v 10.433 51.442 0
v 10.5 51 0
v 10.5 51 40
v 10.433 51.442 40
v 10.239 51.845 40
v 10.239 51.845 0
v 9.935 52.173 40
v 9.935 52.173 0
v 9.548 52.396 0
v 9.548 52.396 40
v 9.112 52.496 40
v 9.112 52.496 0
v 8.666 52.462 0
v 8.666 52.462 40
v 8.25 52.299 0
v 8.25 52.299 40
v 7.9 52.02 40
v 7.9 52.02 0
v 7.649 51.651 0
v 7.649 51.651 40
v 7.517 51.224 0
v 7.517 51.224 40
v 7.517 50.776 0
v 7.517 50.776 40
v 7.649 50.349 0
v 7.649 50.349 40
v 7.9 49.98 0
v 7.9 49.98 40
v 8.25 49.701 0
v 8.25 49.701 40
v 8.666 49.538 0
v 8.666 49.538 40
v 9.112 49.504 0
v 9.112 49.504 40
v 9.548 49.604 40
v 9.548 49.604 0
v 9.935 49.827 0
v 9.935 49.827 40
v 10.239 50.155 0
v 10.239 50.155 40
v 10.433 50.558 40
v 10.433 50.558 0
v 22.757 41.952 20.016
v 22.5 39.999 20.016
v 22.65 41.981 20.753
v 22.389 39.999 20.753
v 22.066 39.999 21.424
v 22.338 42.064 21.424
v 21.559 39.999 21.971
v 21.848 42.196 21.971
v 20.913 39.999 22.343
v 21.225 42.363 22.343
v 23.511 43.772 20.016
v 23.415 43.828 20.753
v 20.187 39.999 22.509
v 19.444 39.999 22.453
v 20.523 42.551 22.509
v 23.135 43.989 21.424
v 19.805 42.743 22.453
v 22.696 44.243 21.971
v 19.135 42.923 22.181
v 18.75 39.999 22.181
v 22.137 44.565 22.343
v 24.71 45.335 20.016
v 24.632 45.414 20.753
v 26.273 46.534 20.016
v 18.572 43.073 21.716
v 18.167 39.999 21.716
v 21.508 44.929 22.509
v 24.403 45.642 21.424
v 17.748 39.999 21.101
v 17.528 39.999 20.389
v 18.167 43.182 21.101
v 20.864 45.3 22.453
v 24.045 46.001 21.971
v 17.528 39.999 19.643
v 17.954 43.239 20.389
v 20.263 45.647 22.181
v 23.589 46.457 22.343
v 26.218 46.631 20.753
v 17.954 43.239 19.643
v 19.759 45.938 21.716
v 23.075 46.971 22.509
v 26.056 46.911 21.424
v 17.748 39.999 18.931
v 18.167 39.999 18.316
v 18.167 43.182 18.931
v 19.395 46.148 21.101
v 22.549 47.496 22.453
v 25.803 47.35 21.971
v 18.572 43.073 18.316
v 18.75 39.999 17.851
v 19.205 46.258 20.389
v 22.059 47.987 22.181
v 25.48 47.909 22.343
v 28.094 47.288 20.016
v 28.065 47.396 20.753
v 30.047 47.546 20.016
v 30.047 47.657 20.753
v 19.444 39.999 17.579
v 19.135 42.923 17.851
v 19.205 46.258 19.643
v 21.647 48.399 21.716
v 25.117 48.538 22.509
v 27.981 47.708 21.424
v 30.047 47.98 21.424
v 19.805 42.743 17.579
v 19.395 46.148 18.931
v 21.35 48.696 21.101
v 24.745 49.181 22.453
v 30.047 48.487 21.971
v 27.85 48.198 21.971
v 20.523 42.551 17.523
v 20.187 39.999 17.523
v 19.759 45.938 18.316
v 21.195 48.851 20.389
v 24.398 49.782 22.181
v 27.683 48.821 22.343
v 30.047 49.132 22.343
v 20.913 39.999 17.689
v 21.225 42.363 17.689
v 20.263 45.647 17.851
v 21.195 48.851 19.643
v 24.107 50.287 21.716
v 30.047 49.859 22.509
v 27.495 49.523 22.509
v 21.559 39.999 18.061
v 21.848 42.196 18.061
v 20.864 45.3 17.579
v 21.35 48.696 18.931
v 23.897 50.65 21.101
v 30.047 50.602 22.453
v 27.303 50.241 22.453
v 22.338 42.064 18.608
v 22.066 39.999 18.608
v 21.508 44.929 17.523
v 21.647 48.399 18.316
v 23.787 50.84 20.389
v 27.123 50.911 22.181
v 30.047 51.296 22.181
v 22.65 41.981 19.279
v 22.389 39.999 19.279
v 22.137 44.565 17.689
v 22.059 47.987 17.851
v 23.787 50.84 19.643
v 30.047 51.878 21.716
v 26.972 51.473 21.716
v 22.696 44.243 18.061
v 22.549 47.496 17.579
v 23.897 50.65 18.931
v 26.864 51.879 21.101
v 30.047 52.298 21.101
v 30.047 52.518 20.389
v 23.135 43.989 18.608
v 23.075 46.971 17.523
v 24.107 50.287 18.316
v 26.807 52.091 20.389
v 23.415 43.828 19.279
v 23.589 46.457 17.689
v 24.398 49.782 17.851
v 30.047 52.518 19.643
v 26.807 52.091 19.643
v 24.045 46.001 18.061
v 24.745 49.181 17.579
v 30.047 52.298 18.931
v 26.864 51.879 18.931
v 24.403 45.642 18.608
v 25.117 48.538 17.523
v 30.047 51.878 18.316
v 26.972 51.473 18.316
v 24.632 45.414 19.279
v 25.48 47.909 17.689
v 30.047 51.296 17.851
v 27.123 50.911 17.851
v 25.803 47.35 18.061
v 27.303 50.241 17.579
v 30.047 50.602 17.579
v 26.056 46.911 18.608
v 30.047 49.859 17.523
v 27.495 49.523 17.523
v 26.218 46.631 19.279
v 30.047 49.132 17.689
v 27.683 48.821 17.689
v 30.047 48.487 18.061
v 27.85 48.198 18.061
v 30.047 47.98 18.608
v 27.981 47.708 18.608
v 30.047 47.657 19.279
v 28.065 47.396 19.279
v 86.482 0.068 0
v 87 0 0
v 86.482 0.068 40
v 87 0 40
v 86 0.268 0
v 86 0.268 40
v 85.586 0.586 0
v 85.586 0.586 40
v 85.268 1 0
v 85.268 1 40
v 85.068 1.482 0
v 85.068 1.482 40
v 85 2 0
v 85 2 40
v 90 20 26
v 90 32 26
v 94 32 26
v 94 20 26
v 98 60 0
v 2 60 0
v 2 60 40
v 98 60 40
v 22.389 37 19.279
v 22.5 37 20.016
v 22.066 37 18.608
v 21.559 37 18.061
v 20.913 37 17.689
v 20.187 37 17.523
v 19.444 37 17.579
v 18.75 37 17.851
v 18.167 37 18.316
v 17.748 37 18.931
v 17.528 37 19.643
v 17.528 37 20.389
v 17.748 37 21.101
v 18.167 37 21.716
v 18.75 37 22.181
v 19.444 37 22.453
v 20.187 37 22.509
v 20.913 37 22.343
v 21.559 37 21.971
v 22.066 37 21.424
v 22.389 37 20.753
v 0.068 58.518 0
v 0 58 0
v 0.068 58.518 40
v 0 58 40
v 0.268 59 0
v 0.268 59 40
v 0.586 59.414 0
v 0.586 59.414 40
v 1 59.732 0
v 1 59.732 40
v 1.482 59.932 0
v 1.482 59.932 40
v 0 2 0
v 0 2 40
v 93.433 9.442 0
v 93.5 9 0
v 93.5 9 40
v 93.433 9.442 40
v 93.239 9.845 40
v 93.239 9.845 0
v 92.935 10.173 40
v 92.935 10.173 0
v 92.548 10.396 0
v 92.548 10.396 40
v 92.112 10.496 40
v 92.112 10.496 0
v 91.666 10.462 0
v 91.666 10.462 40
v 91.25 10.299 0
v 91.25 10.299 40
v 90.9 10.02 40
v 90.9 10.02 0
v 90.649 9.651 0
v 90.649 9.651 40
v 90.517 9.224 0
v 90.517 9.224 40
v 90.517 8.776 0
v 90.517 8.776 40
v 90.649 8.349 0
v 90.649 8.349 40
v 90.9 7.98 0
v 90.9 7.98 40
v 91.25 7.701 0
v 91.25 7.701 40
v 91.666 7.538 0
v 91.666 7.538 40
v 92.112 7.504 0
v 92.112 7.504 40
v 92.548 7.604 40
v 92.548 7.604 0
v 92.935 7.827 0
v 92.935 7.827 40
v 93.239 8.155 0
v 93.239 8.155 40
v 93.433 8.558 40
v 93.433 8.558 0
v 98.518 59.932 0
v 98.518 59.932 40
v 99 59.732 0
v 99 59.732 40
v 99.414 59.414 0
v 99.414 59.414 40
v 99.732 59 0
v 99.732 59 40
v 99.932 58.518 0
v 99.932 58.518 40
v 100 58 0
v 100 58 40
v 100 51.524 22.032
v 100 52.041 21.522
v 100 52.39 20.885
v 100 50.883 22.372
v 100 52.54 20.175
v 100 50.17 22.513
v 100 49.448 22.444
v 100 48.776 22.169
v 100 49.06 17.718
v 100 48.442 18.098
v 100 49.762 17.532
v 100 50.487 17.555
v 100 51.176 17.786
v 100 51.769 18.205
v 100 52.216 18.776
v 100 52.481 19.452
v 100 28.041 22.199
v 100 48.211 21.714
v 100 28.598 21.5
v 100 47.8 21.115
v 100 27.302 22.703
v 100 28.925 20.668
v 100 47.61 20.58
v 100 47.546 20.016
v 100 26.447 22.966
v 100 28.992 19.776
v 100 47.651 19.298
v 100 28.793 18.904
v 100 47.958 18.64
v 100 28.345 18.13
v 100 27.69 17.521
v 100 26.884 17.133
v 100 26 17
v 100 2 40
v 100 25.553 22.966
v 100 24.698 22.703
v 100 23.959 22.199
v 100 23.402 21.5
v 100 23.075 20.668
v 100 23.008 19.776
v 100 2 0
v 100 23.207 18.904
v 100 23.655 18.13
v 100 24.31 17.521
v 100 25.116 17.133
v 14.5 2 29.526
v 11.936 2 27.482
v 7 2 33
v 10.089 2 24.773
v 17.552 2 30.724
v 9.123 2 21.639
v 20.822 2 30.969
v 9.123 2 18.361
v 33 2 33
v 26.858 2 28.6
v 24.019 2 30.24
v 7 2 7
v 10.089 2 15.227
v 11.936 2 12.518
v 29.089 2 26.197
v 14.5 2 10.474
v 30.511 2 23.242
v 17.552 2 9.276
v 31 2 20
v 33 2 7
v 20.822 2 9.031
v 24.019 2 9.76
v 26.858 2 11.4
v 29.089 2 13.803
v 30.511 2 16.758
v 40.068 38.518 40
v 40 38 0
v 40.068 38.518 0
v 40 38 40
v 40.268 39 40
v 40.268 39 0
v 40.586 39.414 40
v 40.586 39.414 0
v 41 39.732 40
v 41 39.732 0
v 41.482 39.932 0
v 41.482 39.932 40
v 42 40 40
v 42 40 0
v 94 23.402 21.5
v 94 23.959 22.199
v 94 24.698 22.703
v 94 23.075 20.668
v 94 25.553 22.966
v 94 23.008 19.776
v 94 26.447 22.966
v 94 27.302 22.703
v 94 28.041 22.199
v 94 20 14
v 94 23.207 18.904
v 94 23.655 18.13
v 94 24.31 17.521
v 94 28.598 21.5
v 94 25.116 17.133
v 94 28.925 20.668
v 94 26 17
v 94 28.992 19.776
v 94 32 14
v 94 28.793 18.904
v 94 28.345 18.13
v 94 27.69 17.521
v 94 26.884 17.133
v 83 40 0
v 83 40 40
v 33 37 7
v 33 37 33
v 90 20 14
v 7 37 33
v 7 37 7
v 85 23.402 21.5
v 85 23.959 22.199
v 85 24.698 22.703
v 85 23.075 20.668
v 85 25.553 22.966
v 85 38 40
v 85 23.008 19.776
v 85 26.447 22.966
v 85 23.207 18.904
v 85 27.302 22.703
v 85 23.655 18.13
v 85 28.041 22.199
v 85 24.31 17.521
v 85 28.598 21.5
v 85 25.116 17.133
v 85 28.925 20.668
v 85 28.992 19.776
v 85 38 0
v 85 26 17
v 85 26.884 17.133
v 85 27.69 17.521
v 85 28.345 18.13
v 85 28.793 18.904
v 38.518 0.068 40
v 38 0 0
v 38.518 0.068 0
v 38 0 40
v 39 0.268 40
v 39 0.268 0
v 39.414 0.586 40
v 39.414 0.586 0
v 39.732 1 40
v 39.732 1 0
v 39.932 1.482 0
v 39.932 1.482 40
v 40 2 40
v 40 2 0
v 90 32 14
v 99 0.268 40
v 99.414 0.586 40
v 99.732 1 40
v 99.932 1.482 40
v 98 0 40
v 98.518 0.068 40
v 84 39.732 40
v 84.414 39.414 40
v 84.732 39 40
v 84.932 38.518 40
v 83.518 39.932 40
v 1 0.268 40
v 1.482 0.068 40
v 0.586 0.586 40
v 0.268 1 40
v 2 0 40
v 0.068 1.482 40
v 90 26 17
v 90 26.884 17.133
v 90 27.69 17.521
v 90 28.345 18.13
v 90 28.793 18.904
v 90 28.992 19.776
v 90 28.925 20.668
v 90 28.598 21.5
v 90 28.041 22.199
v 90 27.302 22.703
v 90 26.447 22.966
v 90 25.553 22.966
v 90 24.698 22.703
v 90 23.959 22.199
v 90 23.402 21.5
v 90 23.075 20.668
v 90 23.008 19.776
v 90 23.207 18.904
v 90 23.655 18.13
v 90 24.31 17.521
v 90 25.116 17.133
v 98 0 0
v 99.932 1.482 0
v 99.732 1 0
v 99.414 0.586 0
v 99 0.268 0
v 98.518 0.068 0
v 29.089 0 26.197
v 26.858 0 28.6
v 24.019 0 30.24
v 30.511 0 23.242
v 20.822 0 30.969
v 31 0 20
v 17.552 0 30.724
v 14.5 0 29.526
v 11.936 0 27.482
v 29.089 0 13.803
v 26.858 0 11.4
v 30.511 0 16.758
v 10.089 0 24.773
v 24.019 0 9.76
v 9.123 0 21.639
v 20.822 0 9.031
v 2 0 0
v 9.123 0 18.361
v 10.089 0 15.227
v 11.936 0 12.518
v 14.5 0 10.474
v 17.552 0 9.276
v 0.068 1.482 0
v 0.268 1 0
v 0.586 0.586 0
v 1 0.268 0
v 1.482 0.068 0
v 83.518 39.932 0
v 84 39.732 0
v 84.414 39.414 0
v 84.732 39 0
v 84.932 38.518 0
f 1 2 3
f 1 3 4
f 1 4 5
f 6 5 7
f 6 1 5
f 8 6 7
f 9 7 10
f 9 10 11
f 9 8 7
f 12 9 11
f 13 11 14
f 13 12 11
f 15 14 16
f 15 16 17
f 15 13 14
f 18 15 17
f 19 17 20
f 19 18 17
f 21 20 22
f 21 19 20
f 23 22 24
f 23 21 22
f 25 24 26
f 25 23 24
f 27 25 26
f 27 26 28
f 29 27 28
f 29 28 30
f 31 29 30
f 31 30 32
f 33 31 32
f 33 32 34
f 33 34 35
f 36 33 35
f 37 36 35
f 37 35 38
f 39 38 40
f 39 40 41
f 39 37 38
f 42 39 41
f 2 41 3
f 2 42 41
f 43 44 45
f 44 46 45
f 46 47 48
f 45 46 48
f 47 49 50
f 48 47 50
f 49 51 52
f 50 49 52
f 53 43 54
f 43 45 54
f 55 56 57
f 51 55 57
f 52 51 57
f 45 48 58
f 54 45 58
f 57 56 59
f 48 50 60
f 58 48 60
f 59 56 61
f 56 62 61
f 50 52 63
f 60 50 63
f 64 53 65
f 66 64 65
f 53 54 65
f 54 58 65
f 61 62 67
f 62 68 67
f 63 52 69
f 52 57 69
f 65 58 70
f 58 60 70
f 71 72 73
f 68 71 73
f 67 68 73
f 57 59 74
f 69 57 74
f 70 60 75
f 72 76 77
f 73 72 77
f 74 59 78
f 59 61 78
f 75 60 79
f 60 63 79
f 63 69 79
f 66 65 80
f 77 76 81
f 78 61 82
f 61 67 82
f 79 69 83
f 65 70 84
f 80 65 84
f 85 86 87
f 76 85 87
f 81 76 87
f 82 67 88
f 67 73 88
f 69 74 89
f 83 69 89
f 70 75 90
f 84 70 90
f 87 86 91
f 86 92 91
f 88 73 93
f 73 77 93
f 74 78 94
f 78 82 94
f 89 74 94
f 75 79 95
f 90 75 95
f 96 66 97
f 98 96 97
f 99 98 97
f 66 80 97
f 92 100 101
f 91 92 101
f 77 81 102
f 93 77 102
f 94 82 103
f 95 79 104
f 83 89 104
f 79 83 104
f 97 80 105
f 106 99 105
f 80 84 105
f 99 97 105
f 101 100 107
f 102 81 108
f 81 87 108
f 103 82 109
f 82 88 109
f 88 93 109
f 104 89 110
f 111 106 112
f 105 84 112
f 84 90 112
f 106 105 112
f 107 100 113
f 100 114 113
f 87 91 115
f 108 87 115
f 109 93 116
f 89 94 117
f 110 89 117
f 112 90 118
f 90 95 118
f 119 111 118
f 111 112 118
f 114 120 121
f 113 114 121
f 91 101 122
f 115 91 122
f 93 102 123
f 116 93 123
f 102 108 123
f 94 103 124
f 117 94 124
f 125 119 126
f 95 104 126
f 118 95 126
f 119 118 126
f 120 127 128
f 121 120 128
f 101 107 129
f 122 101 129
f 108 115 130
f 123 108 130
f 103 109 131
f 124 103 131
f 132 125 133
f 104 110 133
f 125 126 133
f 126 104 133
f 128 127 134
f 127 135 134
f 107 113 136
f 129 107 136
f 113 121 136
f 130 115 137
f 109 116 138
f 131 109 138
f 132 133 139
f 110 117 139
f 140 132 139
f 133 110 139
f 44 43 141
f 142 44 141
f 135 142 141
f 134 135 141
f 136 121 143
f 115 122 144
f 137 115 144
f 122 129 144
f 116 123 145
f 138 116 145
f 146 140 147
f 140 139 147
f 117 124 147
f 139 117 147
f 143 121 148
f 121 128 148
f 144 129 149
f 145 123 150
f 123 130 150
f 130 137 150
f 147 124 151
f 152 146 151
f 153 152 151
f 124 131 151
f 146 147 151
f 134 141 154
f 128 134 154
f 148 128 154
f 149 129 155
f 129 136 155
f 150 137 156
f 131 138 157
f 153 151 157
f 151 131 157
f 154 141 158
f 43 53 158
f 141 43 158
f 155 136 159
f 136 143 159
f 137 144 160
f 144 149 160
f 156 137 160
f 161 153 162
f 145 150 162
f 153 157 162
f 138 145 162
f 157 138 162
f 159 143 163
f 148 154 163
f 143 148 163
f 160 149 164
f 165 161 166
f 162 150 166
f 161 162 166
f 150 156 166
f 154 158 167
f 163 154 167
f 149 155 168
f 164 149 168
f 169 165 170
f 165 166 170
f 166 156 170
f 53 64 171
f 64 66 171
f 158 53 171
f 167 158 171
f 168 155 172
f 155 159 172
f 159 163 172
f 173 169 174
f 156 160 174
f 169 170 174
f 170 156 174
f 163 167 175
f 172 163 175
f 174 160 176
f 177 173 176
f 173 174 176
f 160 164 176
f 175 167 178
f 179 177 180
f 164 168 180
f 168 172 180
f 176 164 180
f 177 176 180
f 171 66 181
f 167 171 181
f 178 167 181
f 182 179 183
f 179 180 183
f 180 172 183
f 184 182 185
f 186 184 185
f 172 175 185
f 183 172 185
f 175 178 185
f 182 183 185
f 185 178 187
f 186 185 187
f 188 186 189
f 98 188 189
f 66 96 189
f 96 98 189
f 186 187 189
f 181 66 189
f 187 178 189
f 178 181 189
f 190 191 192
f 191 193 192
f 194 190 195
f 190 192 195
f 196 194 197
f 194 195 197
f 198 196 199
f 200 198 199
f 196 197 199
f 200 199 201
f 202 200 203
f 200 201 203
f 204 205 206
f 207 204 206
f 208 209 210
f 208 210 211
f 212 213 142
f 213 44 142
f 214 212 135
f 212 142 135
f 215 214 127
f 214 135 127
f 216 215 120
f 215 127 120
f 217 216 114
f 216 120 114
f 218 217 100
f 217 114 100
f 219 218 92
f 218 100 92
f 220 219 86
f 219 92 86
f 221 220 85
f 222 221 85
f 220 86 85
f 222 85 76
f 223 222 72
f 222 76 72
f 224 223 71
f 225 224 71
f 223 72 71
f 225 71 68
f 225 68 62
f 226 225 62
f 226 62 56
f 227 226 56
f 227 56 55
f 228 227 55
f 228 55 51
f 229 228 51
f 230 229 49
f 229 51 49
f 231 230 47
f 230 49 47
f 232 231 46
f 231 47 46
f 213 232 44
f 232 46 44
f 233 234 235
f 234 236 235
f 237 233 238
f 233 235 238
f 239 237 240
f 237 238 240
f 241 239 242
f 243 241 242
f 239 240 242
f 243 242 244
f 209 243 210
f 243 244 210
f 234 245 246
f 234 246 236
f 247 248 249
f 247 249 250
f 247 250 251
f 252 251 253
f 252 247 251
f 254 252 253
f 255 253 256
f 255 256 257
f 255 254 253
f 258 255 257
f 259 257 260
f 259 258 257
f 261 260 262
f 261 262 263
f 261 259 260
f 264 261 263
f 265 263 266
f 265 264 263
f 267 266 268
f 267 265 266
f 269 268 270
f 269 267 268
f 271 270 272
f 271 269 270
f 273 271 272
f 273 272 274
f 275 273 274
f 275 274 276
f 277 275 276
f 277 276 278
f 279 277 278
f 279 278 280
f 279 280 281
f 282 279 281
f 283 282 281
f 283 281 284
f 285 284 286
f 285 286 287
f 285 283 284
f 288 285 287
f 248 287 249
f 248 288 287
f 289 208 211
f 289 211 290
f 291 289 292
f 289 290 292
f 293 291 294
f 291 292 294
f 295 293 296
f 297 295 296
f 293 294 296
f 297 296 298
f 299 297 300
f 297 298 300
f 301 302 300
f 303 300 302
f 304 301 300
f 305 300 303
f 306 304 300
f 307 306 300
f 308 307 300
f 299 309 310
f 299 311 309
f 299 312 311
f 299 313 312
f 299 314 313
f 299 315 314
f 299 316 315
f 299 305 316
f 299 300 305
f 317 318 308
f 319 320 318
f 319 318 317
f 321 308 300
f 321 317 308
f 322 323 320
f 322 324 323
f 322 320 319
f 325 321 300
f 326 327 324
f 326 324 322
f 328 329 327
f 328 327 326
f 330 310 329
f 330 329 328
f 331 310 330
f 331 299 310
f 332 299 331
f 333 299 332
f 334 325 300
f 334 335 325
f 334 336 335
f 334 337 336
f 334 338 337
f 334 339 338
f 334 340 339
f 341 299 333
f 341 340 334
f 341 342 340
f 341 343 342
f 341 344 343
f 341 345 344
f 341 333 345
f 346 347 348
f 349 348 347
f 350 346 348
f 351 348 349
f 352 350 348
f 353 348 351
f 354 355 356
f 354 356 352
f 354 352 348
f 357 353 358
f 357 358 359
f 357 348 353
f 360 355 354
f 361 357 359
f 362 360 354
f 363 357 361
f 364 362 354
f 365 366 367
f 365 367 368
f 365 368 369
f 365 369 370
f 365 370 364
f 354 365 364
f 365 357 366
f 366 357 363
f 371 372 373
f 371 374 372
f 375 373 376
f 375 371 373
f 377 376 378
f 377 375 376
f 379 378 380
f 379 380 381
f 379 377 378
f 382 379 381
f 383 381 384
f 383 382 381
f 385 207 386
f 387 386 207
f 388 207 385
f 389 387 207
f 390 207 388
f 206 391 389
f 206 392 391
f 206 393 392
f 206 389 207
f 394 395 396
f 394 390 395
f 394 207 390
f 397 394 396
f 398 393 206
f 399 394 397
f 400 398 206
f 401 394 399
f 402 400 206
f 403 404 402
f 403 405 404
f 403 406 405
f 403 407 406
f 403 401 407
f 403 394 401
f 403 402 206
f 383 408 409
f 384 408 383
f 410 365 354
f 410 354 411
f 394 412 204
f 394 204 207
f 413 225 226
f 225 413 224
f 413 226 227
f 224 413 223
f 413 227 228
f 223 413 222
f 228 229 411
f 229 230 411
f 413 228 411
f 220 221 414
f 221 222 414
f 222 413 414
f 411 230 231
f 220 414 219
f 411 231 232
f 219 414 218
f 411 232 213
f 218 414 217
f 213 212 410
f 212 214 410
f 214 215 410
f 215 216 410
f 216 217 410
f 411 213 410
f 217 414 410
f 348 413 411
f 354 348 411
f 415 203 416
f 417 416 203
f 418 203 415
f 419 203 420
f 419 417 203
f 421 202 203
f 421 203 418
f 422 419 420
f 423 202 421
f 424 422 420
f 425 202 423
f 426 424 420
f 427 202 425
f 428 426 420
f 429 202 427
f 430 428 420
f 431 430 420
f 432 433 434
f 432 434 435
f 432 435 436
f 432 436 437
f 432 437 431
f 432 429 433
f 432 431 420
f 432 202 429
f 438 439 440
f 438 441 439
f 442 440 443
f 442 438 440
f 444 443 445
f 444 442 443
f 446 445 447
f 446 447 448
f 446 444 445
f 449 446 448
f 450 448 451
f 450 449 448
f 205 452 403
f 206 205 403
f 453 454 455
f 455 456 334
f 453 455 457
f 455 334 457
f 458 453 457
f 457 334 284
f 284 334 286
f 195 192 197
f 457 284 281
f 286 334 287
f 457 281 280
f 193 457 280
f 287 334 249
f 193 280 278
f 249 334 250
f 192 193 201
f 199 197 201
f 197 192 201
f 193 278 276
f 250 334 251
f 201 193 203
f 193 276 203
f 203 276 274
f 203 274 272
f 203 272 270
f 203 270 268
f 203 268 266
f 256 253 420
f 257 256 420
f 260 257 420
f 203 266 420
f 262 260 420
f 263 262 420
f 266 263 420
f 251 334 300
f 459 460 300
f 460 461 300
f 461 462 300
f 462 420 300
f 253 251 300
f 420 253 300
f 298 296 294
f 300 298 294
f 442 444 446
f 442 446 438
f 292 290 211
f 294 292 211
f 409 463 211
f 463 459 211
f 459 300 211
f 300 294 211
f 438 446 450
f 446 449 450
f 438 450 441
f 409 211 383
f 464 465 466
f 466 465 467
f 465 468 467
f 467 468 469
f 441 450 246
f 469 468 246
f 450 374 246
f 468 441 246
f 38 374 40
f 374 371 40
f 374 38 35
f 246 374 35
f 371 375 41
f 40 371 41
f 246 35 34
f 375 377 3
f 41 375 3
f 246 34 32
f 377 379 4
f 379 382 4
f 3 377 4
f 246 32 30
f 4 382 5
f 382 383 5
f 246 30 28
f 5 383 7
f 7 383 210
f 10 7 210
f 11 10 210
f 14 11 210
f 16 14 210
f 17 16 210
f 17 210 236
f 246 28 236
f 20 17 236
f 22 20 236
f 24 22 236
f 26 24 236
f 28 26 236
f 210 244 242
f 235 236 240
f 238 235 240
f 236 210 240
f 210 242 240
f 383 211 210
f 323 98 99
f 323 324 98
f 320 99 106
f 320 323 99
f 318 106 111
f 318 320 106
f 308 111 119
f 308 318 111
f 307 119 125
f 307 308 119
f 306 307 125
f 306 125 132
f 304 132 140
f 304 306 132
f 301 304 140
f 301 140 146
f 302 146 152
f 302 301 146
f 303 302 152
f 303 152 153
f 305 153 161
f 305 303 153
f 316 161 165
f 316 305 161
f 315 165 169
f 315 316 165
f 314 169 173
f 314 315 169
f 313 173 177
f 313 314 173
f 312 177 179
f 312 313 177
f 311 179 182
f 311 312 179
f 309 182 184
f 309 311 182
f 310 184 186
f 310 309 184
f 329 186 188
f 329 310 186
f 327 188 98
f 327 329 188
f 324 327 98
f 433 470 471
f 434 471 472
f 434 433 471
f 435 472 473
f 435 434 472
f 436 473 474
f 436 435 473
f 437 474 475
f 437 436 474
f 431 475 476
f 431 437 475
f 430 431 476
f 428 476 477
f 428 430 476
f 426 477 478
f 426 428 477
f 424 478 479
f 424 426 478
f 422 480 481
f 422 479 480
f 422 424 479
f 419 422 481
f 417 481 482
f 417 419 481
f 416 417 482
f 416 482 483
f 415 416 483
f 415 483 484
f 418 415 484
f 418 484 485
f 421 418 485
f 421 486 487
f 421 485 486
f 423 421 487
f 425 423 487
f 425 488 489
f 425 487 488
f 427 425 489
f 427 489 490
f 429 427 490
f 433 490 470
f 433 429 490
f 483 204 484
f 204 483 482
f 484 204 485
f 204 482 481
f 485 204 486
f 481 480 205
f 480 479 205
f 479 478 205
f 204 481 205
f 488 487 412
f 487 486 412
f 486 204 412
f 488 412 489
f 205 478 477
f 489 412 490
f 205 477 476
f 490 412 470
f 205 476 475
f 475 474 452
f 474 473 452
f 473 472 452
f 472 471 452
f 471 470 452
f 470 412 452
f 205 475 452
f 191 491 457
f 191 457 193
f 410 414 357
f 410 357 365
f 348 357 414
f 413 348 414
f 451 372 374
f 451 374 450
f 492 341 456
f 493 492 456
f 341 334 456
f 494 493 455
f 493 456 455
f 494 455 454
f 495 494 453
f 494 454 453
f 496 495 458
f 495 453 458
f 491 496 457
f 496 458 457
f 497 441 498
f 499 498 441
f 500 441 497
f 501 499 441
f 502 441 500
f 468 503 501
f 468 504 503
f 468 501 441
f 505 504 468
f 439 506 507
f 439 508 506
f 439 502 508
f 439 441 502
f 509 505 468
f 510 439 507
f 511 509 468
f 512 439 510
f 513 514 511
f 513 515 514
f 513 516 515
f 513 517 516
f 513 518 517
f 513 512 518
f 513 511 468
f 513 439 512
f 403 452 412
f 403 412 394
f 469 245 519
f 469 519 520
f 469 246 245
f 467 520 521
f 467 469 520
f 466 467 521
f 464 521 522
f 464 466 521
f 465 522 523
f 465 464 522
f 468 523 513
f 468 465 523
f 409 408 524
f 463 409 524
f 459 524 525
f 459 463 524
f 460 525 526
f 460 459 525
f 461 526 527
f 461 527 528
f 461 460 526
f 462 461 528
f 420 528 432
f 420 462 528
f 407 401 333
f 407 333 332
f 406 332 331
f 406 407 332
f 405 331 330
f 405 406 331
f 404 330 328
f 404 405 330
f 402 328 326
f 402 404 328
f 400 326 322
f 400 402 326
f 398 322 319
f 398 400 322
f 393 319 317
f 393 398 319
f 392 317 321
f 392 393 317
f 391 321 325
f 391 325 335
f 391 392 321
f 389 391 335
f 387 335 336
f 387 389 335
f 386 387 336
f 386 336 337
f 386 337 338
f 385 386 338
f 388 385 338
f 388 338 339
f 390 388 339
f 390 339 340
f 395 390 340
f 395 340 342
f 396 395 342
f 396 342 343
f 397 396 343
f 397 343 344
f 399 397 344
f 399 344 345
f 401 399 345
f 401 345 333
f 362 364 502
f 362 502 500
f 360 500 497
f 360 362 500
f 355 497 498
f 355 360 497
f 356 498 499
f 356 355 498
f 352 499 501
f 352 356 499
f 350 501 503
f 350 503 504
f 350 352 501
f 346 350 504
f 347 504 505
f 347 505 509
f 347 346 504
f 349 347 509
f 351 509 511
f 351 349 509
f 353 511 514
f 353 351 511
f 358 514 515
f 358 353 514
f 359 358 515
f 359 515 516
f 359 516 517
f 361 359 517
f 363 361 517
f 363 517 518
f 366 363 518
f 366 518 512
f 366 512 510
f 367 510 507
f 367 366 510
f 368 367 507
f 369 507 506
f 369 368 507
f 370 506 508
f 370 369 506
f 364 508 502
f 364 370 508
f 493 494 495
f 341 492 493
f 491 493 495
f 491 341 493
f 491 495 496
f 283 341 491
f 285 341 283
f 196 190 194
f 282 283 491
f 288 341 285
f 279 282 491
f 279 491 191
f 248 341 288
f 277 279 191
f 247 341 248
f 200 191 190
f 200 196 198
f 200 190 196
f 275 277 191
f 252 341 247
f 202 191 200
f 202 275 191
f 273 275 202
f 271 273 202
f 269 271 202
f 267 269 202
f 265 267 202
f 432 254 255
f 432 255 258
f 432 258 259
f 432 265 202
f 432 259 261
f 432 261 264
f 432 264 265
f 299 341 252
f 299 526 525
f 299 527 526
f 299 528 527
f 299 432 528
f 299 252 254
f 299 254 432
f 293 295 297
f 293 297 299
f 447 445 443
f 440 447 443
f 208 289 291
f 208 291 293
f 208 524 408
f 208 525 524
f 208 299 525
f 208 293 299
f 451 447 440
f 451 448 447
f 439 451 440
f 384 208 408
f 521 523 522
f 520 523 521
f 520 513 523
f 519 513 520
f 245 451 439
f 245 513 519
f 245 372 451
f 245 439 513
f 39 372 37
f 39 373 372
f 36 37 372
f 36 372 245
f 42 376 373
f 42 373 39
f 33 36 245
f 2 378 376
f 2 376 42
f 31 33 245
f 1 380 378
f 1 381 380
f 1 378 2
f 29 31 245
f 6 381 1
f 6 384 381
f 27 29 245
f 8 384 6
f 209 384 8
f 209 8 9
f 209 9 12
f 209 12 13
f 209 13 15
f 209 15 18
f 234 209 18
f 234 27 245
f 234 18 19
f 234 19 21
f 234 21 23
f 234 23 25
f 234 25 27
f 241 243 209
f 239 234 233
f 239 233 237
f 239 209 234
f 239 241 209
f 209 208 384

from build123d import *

# Parameters (mm, degrees)
SKETCH005_R       = 2.5
CYLINDER_R        = 11
CYLINDER_DEPTH    = 2
BOX001_W          = 26
BOX001_H          = 35
BOX001_DEPTH      = 26
CYLINDER001_R     = 1.5
CYLINDER001_DEPTH = 40
CYLINDER002_R     = 1.5
CYLINDER002_DEPTH = 40
BOX_W             = 4
BOX_H             = 12
BOX_DEPTH         = 12
CYLINDER003_R     = 3
CYLINDER003_DEPTH = 15
PAD_DEPTH         = 40
FILLET_R          = 2


with BuildPart() as sensorcable:
    # Sweep: sweep along a path in Sketch006
    with BuildLine(Plane.XY) as sweep_path:
        Line((20.046883, -0.001316), (20.046883, 39.998684))
        ThreePointArc((20.046883, 39.998684), (22.975815, 47.069752), (30.046883, 49.998684))
        Line((30.046883, 49.998684), (100.046883, 49.998684))
    # Sketch005 → Sweep (sweep)
    with BuildSketch(Plane.XZ):
        with Locations((20, 0.016)):
            Circle(SKETCH005_R)
    sweep(path=sweep_path.line)


with BuildPart() as sensorcable_1:
    # Sweep placement: moved
    add(sensorcable.part.moved(Location((0, 0, 20))))


with BuildPart() as sensorcylinder:
    # Cylinder → Cylinder (new body)
    with BuildSketch(Plane(origin=(20, 2, 20), x_dir=(1, 0, 0), z_dir=(0, -1, 0))):
        Circle(CYLINDER_R)
    extrude(amount=CYLINDER_DEPTH)


with BuildPart() as sensor:
    # Box001 → Box001 (new body)
    with BuildSketch(Plane(origin=(7, 2, 7), x_dir=(1, 0, 0), z_dir=(0, 0, 1))):
        with Locations((13, 17.5)):
            Rectangle(BOX001_W, BOX001_H)
    extrude(amount=BOX001_DEPTH)

    # Fusion001: union sensorCable, sensorCylinder
    add(sensorcable_1.part)
    add(sensorcylinder.part)


with BuildPart() as screw001:
    # Cylinder001 → Cylinder001 (new body)
    with BuildSketch(Plane(origin=(9, 51, 0), x_dir=(1, 0, 0), z_dir=(0, 0, 1))):
        Circle(CYLINDER001_R)
    extrude(amount=CYLINDER001_DEPTH)


with BuildPart() as screws:
    # Cylinder002 → Cylinder002 (new body)
    with BuildSketch(Plane(origin=(92, 9, 0), x_dir=(1, 0, 0), z_dir=(0, 0, 1))):
        Circle(CYLINDER002_R)
    extrude(amount=CYLINDER002_DEPTH)

    # Fusion002: union screw001
    add(screw001.part)


with BuildPart() as nutclamp:
    # Box → Box (new body)
    with BuildSketch(Plane(origin=(90, 20, 14), x_dir=(1, 0, 0), z_dir=(0, 0, 1))):
        with Locations((2, 6)):
            Rectangle(BOX_W, BOX_H)
    extrude(amount=BOX_DEPTH)


with BuildPart() as drills:
    # Cylinder003 → Cylinder003 (new body)
    with BuildSketch(Plane(origin=(85, 26, 20), x_dir=(0, 0, -1), z_dir=(1, 0, 0))):
        Circle(CYLINDER003_R)
    extrude(amount=CYLINDER003_DEPTH)

    # Fusion: union nutClamp
    add(nutclamp.part)

    # Fusion003: union sensor, screws
    add(sensor.part)
    add(screws.part)


with BuildPart() as ultrasonicsensorcase:
    # Sketch → Pad (new body)
    with BuildSketch(Plane.XY):
        Polygon((0, 0), (0, 60), (100, 60), (100, 0), (85, 0), (85, 40), (40, 40), (40, 0), align=None)
    extrude(amount=PAD_DEPTH)

    # Cut: cut drills
    add(drills.part, mode=Mode.SUBTRACT)

    # Fillet
    fillet_edges = [ultrasonicsensorcase.edges().sort_by_distance(p)[0] for p in [
        (0, 0, 20),
        (0, 60, 20),
        (40, 0, 20),
        (100, 60, 20),
        (40, 40, 20),
        (100, 0, 20),
        (85, 40, 20),
        (85, 0, 20),
    ]]
    fillet(fillet_edges, radius=FILLET_R)


solid = ultrasonicsensorcase.part
